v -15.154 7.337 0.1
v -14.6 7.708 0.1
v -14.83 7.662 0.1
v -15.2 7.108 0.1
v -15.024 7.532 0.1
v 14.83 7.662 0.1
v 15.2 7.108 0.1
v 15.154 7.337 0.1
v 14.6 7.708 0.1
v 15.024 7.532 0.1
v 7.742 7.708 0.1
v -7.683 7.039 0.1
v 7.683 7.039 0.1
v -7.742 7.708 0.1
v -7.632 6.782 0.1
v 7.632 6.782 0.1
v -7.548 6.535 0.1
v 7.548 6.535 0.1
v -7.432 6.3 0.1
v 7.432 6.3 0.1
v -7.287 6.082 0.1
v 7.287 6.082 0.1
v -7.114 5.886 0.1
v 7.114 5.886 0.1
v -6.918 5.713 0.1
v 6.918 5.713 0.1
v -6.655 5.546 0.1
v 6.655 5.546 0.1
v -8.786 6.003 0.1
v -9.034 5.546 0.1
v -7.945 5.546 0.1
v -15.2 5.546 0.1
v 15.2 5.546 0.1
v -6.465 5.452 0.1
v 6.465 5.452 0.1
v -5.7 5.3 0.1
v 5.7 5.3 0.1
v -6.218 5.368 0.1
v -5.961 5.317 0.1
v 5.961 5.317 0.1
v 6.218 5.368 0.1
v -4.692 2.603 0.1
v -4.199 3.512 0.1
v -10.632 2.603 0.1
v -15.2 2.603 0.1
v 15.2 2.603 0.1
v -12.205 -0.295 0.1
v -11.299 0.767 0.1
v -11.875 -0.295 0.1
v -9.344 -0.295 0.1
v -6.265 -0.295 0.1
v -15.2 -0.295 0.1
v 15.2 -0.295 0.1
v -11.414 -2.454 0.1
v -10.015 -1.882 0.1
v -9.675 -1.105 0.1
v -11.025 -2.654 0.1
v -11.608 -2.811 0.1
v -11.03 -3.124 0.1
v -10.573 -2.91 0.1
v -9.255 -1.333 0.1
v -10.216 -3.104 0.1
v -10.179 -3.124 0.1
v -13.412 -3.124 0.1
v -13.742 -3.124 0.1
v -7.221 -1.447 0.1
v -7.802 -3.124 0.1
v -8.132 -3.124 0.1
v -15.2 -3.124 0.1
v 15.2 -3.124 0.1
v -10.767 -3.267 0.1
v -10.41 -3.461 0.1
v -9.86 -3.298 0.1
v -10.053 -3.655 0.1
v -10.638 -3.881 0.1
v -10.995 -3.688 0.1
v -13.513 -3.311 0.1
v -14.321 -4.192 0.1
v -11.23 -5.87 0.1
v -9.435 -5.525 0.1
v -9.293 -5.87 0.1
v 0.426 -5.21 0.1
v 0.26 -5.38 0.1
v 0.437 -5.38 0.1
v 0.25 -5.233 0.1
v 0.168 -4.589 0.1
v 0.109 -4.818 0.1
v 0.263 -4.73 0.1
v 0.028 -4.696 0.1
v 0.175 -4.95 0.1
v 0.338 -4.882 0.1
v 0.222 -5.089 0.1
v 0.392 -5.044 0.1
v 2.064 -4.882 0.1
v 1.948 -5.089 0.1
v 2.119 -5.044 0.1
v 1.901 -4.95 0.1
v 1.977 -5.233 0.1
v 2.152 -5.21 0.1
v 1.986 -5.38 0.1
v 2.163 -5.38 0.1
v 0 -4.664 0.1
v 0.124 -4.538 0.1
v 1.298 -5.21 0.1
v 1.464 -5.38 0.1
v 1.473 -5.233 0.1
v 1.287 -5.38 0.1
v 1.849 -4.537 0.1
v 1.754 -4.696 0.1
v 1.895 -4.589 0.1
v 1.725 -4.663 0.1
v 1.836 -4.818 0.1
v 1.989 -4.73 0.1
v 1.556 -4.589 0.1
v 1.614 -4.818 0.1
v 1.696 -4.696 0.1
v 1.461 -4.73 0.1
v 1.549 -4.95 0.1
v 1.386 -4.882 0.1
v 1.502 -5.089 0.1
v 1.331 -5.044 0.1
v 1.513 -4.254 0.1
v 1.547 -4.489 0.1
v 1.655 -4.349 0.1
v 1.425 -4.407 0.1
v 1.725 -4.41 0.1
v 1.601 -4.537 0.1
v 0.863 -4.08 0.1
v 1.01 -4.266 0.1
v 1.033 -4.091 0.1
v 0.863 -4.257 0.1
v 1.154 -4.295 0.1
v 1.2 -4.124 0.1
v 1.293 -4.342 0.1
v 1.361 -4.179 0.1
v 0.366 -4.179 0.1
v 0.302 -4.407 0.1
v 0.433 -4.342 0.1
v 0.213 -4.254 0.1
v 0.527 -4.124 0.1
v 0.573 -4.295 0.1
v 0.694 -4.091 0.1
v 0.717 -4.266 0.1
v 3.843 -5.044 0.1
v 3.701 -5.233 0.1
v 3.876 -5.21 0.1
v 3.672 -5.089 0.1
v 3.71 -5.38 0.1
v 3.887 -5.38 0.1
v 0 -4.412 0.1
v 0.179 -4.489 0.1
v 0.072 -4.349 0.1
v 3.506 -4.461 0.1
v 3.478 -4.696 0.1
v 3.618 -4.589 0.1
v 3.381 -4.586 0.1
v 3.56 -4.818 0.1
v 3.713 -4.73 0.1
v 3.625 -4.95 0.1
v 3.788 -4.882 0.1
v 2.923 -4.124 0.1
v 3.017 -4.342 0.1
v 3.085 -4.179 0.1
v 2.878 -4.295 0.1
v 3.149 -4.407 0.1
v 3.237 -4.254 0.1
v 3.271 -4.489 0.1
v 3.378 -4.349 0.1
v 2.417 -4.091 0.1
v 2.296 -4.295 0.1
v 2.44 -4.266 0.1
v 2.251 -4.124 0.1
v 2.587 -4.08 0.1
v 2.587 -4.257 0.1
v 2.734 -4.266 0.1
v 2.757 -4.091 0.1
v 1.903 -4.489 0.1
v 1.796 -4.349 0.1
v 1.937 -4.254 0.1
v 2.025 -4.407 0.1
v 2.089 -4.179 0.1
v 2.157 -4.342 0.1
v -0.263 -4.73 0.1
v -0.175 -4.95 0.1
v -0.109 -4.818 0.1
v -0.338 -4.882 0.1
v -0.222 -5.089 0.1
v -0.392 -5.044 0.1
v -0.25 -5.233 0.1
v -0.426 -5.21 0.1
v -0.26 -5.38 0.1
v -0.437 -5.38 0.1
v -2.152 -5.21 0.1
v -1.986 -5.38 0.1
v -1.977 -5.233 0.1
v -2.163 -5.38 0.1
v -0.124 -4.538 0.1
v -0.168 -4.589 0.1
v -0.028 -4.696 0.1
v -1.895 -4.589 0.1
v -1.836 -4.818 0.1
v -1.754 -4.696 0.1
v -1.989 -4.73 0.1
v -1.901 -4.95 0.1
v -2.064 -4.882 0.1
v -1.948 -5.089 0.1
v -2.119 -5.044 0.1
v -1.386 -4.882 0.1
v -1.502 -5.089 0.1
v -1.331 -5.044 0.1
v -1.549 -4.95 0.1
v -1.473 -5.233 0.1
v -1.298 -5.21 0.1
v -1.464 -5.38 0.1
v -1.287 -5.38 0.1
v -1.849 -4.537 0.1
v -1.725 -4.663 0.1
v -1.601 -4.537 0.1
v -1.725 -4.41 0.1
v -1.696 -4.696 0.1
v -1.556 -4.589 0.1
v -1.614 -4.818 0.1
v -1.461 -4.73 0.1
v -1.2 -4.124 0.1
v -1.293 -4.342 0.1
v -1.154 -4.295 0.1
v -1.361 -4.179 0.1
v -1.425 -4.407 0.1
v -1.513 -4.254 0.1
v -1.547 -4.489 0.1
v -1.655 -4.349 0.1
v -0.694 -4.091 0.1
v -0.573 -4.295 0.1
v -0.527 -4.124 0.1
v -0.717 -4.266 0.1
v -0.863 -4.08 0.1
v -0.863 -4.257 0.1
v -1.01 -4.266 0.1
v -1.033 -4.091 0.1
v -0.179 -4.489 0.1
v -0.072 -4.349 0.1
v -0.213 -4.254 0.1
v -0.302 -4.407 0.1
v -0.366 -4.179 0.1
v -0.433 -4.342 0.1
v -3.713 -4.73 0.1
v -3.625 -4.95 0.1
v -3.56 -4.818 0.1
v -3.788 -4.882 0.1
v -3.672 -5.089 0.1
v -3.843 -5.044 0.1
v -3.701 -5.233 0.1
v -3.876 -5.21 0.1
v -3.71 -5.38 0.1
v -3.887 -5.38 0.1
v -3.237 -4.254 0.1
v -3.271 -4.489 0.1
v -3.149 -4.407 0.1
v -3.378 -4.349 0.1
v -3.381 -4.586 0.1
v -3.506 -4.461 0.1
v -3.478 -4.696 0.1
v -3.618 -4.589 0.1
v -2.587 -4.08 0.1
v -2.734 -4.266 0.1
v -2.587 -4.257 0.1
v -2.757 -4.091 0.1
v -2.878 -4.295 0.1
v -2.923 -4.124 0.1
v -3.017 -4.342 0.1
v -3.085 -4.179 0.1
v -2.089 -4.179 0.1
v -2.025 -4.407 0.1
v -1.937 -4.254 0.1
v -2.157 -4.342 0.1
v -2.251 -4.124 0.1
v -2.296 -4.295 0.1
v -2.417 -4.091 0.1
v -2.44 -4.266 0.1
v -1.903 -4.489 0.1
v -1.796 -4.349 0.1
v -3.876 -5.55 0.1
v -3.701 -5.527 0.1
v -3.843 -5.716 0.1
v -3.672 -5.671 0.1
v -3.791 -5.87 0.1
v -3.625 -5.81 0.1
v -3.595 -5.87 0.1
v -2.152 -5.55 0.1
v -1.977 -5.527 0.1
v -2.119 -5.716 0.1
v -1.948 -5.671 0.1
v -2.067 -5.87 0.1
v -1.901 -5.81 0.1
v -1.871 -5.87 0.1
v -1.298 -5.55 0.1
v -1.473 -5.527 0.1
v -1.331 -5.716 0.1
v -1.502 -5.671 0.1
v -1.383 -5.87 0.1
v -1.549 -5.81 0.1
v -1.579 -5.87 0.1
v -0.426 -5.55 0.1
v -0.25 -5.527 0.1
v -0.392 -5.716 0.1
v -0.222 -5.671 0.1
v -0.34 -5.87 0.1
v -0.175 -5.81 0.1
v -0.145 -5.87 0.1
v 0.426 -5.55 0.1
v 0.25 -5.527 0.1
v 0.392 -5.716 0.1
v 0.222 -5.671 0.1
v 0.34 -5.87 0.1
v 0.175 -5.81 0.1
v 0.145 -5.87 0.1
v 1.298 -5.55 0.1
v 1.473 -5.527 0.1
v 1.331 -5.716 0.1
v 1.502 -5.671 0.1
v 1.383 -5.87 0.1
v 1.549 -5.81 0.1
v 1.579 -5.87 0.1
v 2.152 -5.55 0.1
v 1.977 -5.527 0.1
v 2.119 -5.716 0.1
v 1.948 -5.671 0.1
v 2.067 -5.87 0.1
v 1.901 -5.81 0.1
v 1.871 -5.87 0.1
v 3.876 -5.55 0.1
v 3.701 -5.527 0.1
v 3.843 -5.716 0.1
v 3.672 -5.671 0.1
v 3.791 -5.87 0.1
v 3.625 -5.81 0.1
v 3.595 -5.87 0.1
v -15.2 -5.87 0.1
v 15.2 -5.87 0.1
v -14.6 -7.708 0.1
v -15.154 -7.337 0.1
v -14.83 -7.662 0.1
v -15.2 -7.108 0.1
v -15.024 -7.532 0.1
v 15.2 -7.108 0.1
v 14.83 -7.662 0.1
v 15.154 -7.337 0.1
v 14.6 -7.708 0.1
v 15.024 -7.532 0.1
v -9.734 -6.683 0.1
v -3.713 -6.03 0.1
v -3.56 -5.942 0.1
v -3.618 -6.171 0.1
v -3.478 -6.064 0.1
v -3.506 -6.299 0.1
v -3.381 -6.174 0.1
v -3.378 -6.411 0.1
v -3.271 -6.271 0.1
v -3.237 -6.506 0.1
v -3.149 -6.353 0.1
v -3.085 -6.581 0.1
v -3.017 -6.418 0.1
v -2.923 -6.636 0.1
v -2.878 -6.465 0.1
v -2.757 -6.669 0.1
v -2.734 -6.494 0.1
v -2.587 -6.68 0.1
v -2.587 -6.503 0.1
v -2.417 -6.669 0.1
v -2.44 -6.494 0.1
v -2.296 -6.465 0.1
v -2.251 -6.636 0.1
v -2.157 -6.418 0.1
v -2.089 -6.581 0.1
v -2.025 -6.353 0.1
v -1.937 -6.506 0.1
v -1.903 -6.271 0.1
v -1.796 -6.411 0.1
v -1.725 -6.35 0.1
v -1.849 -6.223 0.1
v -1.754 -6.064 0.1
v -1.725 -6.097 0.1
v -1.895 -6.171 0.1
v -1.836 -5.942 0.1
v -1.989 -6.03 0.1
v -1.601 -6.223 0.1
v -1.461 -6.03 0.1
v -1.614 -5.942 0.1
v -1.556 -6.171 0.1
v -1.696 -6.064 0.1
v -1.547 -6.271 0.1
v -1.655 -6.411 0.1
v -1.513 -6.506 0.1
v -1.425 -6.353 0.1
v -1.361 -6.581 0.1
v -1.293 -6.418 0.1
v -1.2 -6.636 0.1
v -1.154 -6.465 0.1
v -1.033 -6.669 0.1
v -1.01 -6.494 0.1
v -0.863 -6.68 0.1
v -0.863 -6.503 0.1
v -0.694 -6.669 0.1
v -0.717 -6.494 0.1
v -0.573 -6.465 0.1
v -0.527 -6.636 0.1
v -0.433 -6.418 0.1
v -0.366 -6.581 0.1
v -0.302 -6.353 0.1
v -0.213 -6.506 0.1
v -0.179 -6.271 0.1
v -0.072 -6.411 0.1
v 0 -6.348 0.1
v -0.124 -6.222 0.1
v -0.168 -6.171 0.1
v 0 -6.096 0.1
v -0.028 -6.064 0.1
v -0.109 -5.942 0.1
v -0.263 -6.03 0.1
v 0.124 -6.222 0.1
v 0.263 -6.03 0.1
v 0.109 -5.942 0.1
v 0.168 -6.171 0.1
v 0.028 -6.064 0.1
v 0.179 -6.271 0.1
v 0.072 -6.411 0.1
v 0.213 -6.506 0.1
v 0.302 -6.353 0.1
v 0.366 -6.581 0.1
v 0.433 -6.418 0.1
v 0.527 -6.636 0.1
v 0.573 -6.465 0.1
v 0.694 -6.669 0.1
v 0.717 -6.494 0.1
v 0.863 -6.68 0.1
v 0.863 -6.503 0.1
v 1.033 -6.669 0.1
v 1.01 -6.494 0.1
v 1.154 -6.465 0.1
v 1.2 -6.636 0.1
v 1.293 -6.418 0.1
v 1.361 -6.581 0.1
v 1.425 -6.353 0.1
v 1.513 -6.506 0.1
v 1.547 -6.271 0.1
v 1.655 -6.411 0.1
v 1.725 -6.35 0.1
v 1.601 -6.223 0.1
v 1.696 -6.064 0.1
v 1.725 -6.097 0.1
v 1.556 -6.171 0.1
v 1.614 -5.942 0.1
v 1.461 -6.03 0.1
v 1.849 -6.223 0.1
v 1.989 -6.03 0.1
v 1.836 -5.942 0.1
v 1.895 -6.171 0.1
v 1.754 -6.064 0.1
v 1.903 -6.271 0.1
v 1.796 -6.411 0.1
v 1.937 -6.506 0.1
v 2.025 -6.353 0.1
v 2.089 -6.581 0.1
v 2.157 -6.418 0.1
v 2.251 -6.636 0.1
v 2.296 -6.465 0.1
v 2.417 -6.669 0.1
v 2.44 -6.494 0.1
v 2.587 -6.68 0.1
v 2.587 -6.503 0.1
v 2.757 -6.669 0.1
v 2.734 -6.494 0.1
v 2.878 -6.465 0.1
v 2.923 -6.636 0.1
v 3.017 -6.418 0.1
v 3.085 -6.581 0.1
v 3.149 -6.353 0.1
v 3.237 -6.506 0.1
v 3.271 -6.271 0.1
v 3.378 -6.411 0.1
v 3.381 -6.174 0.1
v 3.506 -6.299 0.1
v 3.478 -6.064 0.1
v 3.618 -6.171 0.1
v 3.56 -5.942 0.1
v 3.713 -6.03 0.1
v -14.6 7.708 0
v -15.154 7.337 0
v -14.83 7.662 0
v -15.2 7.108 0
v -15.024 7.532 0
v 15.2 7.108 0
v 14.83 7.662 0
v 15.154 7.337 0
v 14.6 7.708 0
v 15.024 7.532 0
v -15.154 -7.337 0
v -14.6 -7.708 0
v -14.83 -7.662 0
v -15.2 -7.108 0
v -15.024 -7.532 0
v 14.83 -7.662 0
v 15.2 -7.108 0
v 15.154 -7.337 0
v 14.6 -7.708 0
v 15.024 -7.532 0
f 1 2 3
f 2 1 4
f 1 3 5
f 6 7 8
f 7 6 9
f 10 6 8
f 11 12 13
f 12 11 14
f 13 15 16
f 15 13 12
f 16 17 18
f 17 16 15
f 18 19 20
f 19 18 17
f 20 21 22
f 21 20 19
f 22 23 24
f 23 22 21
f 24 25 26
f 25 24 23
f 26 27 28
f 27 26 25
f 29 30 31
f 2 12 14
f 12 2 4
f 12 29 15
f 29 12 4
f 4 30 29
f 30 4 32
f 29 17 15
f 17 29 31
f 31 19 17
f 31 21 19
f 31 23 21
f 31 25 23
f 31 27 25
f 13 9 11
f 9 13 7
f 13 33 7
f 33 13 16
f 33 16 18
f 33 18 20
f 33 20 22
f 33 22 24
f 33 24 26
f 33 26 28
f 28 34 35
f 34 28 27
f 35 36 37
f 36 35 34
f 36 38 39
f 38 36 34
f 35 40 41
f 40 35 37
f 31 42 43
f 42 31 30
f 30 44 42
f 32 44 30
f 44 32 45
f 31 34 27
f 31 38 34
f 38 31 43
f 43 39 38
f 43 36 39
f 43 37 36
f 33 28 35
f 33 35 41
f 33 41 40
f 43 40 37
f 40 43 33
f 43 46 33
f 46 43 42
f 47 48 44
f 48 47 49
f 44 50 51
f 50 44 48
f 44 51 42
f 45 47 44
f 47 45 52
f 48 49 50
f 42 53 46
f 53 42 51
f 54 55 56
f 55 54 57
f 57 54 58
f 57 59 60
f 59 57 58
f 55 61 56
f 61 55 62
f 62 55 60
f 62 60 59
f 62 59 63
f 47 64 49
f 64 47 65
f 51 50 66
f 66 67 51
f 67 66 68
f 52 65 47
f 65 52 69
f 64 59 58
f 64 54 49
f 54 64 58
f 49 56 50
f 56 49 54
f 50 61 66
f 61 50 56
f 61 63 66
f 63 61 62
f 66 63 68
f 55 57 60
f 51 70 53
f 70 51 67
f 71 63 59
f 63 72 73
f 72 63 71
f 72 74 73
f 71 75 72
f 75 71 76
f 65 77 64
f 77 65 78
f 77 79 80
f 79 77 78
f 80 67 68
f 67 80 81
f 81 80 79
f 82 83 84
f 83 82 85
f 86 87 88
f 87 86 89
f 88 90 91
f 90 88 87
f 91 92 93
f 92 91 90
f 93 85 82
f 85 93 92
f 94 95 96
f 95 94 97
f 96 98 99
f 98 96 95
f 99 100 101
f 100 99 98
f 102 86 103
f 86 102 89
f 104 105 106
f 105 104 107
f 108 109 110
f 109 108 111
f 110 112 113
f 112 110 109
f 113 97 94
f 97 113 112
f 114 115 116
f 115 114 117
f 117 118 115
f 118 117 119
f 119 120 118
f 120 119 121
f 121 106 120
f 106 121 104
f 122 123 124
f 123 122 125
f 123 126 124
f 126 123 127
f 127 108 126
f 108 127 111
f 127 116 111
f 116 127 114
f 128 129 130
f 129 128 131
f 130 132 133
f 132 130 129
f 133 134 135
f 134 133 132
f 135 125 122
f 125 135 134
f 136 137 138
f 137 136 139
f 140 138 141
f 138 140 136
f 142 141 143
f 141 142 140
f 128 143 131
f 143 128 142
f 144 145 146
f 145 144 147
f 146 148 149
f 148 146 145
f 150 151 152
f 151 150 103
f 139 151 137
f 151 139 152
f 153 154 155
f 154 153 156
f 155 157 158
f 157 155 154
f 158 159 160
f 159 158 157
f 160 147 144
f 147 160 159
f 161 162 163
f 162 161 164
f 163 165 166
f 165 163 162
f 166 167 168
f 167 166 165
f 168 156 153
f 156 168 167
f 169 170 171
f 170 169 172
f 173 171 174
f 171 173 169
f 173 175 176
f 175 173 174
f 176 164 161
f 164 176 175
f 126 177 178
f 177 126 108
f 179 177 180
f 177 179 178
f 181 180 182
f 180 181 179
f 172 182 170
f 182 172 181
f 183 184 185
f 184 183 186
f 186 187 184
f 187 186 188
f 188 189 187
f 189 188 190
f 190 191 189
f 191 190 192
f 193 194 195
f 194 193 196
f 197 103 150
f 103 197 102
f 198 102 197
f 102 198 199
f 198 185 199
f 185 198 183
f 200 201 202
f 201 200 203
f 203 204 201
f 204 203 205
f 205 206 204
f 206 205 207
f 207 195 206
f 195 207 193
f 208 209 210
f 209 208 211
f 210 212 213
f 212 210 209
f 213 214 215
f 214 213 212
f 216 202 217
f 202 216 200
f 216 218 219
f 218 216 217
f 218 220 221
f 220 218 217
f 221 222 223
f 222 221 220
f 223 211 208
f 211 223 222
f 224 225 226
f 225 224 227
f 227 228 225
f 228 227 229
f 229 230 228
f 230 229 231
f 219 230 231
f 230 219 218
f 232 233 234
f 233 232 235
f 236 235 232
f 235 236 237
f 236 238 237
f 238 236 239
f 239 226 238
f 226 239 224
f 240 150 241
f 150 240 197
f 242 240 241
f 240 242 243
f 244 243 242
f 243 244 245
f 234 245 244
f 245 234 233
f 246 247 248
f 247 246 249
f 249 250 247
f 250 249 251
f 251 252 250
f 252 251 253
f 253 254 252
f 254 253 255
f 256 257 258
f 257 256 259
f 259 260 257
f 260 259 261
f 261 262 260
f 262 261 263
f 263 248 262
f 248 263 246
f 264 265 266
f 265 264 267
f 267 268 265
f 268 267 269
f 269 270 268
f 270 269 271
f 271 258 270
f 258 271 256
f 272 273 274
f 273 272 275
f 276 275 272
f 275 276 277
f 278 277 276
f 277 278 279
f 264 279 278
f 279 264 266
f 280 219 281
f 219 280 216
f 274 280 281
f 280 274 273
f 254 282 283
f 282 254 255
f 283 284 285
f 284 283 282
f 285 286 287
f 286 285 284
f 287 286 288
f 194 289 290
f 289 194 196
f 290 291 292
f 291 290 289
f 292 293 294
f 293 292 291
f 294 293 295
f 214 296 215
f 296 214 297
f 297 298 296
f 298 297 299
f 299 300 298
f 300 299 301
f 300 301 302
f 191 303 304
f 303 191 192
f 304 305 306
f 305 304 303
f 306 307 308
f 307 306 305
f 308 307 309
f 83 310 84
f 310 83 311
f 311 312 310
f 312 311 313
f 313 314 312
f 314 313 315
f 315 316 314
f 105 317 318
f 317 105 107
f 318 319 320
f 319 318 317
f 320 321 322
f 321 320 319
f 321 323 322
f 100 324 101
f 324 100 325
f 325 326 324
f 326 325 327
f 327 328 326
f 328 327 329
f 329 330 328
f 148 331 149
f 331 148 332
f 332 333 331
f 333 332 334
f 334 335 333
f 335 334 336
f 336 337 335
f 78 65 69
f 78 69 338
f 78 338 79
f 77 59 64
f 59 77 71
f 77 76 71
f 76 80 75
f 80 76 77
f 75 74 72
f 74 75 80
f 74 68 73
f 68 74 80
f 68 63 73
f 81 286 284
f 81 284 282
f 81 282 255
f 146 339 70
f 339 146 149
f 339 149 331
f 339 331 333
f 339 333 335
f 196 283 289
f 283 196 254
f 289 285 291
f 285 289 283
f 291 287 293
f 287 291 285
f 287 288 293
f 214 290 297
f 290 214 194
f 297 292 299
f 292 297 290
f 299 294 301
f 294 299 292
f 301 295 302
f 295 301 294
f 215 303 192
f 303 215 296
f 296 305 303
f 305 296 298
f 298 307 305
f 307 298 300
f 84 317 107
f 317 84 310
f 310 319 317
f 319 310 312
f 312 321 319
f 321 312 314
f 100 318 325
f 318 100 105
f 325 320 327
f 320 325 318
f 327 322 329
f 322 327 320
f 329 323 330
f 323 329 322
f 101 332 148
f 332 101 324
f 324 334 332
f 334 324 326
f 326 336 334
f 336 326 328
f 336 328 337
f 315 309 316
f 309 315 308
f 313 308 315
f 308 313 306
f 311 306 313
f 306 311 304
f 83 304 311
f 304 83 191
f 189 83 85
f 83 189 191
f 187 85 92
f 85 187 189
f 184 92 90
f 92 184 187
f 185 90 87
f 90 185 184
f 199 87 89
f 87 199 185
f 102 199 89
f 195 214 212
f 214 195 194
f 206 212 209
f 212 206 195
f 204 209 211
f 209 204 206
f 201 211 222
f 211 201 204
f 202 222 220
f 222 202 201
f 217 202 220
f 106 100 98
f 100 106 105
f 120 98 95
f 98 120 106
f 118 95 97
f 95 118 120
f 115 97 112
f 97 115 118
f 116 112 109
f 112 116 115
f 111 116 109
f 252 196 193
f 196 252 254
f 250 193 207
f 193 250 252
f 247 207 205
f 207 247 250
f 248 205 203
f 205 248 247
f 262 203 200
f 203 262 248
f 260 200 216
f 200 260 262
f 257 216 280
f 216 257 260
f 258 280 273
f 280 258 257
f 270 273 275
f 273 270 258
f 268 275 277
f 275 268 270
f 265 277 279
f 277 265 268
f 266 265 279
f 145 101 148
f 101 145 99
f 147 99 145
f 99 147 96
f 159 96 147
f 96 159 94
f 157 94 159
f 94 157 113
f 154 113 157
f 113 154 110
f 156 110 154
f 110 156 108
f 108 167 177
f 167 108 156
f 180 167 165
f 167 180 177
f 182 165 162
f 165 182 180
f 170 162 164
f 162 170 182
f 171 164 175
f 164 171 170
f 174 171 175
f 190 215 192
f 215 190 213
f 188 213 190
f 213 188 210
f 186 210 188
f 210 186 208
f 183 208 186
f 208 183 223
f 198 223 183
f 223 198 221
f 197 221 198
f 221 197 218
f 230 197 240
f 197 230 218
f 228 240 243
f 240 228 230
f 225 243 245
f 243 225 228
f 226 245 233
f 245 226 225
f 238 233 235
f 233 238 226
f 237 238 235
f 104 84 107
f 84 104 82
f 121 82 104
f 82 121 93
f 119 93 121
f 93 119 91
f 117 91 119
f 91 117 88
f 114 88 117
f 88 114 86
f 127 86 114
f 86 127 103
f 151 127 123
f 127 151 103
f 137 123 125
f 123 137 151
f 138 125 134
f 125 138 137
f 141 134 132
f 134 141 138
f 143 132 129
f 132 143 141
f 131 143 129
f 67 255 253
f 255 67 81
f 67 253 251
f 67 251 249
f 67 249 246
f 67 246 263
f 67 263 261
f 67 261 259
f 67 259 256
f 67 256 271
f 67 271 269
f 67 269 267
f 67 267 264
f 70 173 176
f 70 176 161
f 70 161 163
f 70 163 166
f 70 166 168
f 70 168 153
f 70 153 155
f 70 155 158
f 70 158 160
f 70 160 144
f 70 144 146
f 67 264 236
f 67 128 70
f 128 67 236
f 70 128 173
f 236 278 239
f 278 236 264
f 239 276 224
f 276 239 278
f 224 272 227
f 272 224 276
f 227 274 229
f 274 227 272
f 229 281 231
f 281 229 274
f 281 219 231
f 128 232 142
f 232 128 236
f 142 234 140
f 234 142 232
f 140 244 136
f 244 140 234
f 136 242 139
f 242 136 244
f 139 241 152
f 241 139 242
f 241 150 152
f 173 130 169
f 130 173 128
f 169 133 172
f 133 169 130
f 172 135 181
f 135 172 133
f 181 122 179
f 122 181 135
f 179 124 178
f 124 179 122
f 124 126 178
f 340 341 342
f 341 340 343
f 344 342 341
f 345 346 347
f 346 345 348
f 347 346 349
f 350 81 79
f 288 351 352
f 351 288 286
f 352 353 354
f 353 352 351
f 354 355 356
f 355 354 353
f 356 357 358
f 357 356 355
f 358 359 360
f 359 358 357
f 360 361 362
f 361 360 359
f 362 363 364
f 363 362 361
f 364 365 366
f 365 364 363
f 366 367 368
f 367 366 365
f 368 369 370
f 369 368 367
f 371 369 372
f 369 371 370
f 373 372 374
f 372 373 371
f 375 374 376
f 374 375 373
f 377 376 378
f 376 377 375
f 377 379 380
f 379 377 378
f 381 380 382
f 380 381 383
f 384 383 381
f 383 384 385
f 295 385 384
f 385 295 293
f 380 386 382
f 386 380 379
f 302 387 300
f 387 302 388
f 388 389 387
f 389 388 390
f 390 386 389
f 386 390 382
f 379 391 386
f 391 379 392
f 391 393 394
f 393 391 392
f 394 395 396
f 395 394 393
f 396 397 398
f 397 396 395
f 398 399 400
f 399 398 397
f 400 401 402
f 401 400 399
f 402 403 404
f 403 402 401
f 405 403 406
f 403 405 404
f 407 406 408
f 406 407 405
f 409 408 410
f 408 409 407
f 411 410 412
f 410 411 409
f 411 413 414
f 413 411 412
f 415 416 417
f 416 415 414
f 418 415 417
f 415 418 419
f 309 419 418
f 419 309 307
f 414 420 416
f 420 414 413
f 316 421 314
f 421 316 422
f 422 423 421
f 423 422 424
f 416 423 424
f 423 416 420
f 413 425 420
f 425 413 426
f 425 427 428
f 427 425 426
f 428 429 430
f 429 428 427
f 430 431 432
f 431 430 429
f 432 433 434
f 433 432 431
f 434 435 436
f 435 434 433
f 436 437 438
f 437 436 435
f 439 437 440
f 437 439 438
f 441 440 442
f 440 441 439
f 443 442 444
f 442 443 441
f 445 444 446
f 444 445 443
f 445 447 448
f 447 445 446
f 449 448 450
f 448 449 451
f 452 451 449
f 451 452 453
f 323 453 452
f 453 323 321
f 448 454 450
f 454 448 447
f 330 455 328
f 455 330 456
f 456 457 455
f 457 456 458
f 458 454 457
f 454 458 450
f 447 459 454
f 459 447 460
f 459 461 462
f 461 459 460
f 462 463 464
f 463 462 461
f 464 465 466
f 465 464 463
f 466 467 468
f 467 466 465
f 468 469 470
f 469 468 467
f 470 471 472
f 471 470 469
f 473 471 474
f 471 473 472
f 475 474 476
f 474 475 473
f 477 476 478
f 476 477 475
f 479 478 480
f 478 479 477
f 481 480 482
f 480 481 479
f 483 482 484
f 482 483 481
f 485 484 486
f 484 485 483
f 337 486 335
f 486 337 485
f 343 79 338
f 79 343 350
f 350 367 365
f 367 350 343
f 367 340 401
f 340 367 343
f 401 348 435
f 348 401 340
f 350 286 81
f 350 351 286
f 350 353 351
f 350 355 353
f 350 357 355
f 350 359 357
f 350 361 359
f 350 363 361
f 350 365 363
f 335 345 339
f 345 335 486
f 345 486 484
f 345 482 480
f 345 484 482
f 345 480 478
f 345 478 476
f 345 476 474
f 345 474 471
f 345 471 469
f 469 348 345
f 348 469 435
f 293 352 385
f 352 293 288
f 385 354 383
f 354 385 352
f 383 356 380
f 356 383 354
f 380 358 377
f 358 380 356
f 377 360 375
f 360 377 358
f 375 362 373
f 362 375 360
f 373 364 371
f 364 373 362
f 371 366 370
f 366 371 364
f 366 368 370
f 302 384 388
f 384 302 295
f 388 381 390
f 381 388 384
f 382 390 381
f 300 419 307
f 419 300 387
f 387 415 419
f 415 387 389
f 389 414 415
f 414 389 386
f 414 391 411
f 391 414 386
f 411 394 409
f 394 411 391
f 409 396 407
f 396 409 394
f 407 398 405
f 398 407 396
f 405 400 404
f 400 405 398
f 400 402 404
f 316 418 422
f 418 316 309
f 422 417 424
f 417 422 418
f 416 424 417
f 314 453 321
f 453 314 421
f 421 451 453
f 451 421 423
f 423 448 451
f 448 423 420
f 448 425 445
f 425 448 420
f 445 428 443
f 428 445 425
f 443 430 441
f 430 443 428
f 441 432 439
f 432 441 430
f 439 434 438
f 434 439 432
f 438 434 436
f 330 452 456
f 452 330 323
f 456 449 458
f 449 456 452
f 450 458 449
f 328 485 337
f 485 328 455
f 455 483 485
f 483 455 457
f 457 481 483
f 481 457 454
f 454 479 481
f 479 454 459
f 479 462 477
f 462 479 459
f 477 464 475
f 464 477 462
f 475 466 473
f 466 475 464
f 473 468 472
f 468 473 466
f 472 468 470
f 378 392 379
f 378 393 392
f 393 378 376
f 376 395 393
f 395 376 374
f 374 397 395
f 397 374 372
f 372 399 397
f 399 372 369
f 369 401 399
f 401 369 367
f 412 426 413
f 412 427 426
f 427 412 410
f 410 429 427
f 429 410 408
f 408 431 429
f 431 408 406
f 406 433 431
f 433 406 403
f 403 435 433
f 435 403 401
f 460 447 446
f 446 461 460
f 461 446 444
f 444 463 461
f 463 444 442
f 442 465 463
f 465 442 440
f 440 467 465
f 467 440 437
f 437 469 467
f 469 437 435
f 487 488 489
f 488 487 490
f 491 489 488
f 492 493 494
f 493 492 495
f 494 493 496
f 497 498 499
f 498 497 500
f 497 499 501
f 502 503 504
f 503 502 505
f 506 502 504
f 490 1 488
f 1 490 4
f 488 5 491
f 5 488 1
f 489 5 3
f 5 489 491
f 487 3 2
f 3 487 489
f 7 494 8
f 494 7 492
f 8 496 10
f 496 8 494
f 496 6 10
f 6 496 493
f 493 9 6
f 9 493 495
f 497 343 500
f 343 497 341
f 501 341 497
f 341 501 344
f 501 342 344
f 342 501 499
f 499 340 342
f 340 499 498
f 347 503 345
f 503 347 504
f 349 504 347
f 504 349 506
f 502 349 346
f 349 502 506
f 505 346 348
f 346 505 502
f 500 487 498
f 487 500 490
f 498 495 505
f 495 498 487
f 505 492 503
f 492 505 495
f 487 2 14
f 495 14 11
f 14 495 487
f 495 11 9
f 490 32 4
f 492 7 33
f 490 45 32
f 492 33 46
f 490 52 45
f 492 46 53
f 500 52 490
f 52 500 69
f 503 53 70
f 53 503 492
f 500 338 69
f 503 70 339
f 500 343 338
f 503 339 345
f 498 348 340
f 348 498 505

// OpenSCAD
use <../lib.scad>
use <s/6142271ls01.scad>
use <s/6142271ls02.scad>
use <s/6142271ls03.scad>
use <s/6142271ls04.scad>
use <s/6142271ls05.scad>
use <s/6142271ls06.scad>
use <s/6142271ls07.scad>
function ldraw_lib__6142271l() = [
// 0 Sticker  1.9 x  3.8 with Grey Audi Logo and Black 4 on Blue and White Frame on White Background
// 0 Name: 6142271l.dat
// 0 Author: Massimo Maso [Sirio]
// 0 !LDRAW_ORG Part UPDATE 2025-03
// 0 !LICENSE Licensed under CC BY 4.0 : see CAreadme.txt
// 
// 0 BFC CERTIFY CCW
  [0,"BFC","CERTIFY"],
  [0,"BFC","CCW"],
// 
// 0 !KEYWORDS Bricklink 75873stk01a, Brickowl 427960, LMS, R8, Rebrickable 24755
// 0 !KEYWORDS Set 75873, Speed Champions, Ultra
// 
// 0 !HISTORY 2025-03-30 [OrionP] Official Update 2025-03
// 
// 
// 1 16 0 0 13.8765 1 0 0 0 1 0 0 0 1 s\6142271ls01.dat
  [1,16,0,0,13.8765,1,0,0,0,1,0,0,0,1, ldraw_lib__s__6142271ls01()],
// 1 16 0 0 13.8531 1 0 0 0 1 0 0 0 1 s\6142271ls02.dat
  [1,16,0,0,13.8531,1,0,0,0,1,0,0,0,1, ldraw_lib__s__6142271ls02()],
// 1 16 0 0 -.7237 1 0 0 0 1 0 0 0 1 s\6142271ls03.dat
  [1,16,0,0,-.7237,1,0,0,0,1,0,0,0,1, ldraw_lib__s__6142271ls03()],
// 1 16 0 0 -.7493 1 0 0 0 1 0 0 0 1 s\6142271ls04.dat
  [1,16,0,0,-.7493,1,0,0,0,1,0,0,0,1, ldraw_lib__s__6142271ls04()],
// 1 16 0 0 -14.6604 1 0 0 0 1 0 0 0 1 s\6142271ls05.dat
  [1,16,0,0,-14.6604,1,0,0,0,1,0,0,0,1, ldraw_lib__s__6142271ls05()],
// 1 16 0 0 -14.6894 1 0 0 0 1 0 0 0 1 s\6142271ls06.dat
  [1,16,0,0,-14.6894,1,0,0,0,1,0,0,0,1, ldraw_lib__s__6142271ls06()],
// 1 16 0 0 0 1 0 0 0 1 0 0 0 1 s\6142271ls07.dat
  [1,16,0,0,0,1,0,0,0,1,0,0,0,1, ldraw_lib__s__6142271ls07()],
];
module ldraw_lib__6142271l(step=0, col=false, unit=2/5, alt=false, line=0.2, solid=!$preview)
    makepoly(ldraw_lib__6142271l(), step=step, col=col, unit=unit, alt=alt, line=line, solid=solid);
ldraw_lib__6142271l(line=0.2);
